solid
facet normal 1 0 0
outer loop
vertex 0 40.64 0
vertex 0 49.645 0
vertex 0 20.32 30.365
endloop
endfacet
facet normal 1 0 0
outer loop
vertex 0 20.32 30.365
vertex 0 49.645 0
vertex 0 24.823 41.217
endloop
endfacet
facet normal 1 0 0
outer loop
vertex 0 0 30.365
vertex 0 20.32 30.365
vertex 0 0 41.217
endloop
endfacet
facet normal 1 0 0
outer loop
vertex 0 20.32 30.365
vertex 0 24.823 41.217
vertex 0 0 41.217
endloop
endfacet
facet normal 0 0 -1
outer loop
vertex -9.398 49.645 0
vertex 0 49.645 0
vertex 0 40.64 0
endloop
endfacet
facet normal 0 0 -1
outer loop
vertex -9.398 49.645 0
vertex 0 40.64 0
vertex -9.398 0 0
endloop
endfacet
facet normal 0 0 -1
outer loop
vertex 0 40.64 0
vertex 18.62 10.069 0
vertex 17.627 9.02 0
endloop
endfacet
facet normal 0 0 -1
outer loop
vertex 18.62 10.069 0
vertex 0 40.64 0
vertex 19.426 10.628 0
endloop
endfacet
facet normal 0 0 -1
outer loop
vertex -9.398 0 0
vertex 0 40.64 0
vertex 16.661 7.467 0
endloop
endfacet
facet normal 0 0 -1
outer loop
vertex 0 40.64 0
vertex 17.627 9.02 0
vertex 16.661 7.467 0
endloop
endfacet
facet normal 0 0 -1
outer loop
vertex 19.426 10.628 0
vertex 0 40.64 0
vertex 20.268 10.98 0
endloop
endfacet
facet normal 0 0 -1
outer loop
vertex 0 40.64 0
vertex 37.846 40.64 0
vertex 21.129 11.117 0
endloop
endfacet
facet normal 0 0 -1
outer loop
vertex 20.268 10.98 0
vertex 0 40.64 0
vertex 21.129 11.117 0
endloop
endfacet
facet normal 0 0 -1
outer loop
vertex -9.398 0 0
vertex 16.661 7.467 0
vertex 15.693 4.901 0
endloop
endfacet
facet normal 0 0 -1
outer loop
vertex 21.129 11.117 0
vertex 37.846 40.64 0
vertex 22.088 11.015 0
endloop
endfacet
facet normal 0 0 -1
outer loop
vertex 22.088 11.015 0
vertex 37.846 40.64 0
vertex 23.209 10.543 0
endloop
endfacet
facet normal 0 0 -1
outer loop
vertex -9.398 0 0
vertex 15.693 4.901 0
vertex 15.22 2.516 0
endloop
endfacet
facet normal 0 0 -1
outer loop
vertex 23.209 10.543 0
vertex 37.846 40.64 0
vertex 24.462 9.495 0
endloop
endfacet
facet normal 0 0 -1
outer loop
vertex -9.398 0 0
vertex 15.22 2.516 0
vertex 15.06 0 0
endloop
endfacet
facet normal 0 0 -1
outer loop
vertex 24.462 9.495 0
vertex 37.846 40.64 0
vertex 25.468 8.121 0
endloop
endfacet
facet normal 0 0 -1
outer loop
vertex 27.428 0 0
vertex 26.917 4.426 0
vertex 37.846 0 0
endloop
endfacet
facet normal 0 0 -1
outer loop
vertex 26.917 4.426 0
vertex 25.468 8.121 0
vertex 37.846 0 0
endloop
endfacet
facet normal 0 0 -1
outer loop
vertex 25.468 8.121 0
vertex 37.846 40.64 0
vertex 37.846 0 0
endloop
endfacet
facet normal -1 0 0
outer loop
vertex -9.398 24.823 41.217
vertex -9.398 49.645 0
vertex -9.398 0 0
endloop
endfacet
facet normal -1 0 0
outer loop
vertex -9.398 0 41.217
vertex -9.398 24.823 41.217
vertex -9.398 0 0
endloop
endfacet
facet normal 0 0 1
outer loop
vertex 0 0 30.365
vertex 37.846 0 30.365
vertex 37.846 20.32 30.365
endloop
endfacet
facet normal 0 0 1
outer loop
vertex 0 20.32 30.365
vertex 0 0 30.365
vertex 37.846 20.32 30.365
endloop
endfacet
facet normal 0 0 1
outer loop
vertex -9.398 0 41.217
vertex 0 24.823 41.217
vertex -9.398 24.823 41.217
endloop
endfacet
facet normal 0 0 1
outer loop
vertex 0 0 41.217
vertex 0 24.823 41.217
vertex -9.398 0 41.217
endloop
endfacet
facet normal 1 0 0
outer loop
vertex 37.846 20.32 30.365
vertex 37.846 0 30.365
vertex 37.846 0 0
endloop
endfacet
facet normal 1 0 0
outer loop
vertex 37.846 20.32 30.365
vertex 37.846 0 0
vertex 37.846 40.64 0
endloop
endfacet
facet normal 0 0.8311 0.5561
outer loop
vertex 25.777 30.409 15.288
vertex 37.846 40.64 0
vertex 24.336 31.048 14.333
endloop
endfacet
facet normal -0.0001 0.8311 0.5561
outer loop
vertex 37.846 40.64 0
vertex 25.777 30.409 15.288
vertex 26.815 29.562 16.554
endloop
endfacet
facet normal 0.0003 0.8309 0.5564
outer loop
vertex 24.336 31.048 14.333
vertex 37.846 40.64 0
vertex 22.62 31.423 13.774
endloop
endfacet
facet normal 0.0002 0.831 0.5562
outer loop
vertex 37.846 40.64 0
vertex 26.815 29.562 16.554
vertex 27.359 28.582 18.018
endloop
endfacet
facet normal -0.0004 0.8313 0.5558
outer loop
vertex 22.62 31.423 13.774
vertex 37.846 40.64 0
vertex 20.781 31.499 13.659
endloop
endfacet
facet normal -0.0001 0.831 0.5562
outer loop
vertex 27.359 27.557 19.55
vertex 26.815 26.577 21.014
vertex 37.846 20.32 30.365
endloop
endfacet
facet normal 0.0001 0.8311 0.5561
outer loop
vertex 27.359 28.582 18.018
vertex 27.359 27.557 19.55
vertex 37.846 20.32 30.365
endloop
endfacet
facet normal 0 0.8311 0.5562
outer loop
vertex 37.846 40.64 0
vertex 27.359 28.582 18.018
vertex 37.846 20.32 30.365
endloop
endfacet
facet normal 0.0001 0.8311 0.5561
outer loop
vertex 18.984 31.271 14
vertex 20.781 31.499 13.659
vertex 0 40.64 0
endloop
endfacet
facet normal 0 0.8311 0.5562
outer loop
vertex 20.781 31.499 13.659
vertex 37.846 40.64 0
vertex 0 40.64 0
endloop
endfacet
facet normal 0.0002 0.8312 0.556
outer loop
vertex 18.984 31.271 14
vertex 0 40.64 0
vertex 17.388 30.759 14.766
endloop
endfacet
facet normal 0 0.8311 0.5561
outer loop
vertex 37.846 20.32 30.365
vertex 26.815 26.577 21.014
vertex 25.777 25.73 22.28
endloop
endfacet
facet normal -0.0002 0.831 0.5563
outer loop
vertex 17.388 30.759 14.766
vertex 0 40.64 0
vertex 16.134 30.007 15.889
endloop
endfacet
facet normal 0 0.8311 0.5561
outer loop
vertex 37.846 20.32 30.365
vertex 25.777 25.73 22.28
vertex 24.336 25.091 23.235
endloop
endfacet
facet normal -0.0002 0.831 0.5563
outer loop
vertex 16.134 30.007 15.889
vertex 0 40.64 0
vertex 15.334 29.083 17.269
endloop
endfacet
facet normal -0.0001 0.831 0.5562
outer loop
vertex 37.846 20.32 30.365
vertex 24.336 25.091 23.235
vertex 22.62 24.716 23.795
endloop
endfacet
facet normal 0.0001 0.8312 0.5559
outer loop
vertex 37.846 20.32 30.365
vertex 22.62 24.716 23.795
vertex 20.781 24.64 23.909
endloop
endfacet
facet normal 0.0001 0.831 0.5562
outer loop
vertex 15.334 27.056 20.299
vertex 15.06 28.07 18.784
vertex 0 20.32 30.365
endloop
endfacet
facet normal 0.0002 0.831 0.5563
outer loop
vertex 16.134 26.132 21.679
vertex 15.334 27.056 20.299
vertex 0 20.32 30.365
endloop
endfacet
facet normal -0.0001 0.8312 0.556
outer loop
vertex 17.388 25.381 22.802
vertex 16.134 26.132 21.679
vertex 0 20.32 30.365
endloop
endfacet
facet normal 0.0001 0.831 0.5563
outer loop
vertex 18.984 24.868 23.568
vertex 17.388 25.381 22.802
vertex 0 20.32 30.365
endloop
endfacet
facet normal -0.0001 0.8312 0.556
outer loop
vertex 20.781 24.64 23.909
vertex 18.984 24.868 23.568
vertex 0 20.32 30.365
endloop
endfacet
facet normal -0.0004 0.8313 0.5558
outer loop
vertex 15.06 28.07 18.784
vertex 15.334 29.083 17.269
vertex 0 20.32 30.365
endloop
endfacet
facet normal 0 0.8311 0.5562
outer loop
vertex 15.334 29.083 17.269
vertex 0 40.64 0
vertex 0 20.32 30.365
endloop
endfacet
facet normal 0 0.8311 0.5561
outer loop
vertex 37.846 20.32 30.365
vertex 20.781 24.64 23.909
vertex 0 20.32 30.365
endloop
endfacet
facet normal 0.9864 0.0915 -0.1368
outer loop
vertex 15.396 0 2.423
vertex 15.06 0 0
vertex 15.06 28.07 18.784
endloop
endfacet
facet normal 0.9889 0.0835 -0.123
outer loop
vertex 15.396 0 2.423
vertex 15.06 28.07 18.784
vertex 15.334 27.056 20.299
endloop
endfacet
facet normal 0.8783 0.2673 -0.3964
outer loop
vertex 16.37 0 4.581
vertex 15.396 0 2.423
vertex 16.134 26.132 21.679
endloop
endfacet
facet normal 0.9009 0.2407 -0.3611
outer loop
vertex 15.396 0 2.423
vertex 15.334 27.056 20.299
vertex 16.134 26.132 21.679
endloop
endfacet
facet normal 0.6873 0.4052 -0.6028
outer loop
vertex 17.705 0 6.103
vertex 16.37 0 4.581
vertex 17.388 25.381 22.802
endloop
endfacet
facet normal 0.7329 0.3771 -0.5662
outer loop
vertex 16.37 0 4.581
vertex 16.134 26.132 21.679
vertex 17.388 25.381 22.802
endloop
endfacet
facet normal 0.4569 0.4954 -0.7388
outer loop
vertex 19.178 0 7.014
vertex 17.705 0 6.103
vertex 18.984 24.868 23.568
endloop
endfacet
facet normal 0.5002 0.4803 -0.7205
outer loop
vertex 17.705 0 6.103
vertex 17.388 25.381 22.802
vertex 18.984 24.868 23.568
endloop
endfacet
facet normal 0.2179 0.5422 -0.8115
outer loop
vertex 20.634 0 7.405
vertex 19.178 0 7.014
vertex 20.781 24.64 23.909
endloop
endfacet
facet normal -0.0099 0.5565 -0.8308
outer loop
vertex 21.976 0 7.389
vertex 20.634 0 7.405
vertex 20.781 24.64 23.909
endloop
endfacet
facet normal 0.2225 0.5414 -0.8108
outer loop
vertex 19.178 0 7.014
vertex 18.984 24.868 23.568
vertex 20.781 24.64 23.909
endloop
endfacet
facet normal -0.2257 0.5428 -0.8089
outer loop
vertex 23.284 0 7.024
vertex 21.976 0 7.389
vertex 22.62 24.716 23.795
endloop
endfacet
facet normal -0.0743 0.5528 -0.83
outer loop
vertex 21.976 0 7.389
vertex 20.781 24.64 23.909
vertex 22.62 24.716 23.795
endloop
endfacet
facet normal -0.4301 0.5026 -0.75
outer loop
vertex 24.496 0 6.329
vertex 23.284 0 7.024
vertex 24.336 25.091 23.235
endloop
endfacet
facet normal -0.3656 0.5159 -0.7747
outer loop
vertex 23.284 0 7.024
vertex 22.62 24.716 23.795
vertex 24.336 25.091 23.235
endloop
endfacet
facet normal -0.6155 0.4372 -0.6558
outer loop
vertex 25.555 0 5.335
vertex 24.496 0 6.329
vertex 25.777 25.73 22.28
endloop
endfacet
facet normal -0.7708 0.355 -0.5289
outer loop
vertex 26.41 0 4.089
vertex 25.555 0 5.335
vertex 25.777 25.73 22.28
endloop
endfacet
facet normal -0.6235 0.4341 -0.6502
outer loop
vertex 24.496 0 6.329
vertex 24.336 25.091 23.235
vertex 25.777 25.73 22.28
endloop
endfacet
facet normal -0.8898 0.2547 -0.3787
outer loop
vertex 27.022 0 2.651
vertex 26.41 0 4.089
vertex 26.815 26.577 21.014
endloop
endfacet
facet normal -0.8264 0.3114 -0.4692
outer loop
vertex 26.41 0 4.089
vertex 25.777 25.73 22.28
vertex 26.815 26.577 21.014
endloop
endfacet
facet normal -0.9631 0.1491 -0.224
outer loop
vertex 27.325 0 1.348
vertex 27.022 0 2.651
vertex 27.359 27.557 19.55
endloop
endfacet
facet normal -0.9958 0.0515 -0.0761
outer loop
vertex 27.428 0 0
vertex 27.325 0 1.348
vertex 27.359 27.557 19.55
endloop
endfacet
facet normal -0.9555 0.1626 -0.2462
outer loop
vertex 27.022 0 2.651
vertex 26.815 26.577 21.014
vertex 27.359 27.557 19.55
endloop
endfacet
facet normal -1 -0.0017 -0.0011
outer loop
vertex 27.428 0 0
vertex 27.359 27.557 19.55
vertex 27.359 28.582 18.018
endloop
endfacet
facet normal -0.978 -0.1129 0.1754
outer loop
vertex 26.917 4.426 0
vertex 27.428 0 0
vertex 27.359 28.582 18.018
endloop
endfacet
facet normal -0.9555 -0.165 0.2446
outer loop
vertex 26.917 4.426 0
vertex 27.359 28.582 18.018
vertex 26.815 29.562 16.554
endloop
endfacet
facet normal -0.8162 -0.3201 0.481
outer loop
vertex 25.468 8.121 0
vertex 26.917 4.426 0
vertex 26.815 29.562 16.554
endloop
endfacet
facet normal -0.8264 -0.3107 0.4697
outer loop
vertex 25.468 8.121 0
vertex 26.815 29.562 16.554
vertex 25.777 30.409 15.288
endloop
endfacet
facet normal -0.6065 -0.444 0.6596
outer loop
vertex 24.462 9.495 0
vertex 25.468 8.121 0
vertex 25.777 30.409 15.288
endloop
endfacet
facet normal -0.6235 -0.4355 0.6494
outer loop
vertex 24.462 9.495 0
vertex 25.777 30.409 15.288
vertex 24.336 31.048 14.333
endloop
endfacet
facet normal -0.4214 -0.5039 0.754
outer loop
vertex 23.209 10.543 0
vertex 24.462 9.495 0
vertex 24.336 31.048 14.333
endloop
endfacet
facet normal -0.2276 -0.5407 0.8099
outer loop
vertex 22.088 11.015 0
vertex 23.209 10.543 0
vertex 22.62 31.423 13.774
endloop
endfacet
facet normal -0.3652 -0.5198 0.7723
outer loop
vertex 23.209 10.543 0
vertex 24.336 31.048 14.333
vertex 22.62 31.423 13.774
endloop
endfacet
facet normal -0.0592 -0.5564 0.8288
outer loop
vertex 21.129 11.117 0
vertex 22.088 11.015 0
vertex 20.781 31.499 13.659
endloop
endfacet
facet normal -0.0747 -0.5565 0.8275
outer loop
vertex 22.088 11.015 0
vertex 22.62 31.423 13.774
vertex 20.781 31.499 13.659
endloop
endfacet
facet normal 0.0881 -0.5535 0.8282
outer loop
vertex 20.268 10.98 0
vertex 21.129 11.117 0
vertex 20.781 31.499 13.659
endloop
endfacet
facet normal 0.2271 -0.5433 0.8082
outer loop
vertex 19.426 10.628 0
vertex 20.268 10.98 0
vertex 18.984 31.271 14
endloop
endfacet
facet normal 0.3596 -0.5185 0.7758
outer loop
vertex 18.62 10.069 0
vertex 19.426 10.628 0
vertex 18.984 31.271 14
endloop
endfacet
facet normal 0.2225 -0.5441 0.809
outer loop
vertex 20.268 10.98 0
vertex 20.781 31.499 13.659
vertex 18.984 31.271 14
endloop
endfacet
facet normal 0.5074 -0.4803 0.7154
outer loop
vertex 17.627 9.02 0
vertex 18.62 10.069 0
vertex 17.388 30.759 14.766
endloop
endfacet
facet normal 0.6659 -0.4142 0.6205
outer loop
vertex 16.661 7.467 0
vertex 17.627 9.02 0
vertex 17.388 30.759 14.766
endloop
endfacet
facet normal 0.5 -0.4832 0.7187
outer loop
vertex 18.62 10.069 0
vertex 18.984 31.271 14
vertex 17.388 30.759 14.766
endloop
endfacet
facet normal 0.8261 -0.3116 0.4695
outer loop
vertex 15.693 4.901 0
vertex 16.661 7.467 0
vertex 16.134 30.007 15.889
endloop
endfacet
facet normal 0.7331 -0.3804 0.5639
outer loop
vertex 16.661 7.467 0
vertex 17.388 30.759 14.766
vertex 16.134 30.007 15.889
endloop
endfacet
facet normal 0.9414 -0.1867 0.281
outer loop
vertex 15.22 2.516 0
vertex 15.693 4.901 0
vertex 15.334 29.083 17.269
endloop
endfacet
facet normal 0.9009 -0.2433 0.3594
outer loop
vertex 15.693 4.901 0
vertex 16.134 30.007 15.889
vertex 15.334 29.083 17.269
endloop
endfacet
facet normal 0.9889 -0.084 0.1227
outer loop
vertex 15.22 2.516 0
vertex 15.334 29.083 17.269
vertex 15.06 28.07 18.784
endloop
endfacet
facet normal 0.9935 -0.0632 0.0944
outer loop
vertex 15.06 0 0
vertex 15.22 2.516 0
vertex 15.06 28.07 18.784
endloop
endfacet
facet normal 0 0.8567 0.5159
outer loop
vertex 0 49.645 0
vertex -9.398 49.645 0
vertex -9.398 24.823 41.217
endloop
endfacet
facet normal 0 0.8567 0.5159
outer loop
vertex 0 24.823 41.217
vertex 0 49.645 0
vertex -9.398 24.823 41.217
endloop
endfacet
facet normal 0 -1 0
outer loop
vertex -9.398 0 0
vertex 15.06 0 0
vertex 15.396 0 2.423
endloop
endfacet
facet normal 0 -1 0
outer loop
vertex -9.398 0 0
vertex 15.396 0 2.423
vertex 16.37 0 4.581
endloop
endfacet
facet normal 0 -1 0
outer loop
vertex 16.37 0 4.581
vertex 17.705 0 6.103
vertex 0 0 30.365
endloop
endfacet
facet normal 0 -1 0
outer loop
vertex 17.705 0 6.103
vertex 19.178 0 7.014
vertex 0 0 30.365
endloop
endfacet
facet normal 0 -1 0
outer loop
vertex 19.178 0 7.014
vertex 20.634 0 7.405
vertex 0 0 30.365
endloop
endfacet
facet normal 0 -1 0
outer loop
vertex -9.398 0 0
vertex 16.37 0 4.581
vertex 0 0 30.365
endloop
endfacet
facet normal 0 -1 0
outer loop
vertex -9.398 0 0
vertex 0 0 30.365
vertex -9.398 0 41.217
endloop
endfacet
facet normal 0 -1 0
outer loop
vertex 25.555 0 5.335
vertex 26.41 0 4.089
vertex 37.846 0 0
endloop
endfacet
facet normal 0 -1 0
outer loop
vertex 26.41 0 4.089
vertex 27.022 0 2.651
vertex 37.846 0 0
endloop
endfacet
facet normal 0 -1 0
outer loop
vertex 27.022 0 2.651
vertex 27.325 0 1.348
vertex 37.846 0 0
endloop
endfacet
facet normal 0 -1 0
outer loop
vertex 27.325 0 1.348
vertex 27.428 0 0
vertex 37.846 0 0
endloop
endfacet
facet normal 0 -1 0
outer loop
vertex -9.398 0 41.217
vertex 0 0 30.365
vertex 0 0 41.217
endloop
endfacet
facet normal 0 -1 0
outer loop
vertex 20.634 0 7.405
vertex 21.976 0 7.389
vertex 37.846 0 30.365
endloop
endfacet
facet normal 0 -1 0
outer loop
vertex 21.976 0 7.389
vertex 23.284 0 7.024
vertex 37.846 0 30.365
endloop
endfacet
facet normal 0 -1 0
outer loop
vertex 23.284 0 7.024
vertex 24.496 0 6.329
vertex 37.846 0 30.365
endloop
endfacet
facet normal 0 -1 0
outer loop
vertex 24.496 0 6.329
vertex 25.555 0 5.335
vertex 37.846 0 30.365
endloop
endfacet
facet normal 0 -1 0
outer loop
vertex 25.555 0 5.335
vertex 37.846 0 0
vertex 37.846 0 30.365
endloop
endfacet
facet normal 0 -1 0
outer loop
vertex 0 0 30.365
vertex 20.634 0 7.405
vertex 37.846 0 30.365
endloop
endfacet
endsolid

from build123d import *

# Parameters (mm, degrees)
F0_W     = 40.64
F0_H     = 30.364547
F1_DEPTH = 37.846
F3_DEPTH = 37.847
F4_W     = 49.645454
F4_H     = 41.217271
F5_DEPTH = 9.398
F7_DEPTH = 47.245
F8_R     = 6.184121
F9_DEPTH = 33.775958


with BuildPart() as f1:
    # F0 (on Right) → F1 (new body)
    with BuildSketch(Plane.YZ):
        with Locations((20.32, 15.182273)):
            Rectangle(F0_W, F0_H)
    extrude(amount=F1_DEPTH)

    # F2 (on face) → F3 (cut, through all)
    with BuildSketch(Plane(origin=(0, 0, 0), x_dir=(0, -1, 0), z_dir=(-1, 0, 0))):
        Polygon((-40.64, 0), (-20.32, 30.364547), (-40.64, 30.364547), align=None)
    extrude(amount=-F3_DEPTH, mode=Mode.SUBTRACT)

    # F4 (on face) → F5 (join)
    with BuildSketch(Plane(origin=(0, 0, 0), x_dir=(0, -1, 0), z_dir=(-1, 0, 0))):
        with Locations((-24.822727, 20.608635)):
            Rectangle(F4_W, F4_H)
    extrude(amount=F5_DEPTH)

    # F6 (on face) → F7 (cut, through all)
    with BuildSketch(Plane(origin=(-9.398, 0, 0), x_dir=(0, -1, 0), z_dir=(-1, 0, 0))):
        Polygon((-49.645454, 0), (-24.822727, 41.217271), (-49.645454, 41.217271), align=None)
    extrude(amount=-F7_DEPTH, mode=Mode.SUBTRACT)

    # F8 (on face) → F9 (cut, through all)
    with BuildSketch(Plane(origin=(0, 28.069582, 18.784206), x_dir=(-1, 0, 0), z_dir=(0, 0.831077, 0.556158))):
        with Locations((-21.243637, 0)):
            Circle(F8_R)
    extrude(amount=-F9_DEPTH, mode=Mode.SUBTRACT)


solid = f1.part
